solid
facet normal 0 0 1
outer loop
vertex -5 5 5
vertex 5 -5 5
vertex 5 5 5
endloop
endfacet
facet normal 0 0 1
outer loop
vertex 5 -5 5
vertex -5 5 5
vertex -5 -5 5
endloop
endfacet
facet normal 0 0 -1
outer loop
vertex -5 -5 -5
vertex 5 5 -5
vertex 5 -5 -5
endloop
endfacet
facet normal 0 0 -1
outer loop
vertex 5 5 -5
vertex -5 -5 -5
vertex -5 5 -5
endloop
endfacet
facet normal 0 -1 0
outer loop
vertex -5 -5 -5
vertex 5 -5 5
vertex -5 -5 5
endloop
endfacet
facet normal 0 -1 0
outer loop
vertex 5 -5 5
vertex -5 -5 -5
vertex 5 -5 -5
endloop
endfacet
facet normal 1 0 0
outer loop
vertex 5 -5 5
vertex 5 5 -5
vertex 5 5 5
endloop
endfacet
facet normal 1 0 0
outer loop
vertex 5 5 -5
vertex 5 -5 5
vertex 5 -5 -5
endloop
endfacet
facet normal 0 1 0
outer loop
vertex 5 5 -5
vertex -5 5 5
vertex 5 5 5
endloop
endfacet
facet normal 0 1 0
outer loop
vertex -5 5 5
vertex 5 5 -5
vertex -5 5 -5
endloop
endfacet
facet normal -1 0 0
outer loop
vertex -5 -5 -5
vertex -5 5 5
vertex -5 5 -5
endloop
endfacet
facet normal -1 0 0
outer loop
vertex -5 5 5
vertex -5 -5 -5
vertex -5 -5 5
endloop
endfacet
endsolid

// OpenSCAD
// param: size=10
module param_cube(size=10) {
    cube([size, size, size], center=true);
}
param_cube(size=10);
